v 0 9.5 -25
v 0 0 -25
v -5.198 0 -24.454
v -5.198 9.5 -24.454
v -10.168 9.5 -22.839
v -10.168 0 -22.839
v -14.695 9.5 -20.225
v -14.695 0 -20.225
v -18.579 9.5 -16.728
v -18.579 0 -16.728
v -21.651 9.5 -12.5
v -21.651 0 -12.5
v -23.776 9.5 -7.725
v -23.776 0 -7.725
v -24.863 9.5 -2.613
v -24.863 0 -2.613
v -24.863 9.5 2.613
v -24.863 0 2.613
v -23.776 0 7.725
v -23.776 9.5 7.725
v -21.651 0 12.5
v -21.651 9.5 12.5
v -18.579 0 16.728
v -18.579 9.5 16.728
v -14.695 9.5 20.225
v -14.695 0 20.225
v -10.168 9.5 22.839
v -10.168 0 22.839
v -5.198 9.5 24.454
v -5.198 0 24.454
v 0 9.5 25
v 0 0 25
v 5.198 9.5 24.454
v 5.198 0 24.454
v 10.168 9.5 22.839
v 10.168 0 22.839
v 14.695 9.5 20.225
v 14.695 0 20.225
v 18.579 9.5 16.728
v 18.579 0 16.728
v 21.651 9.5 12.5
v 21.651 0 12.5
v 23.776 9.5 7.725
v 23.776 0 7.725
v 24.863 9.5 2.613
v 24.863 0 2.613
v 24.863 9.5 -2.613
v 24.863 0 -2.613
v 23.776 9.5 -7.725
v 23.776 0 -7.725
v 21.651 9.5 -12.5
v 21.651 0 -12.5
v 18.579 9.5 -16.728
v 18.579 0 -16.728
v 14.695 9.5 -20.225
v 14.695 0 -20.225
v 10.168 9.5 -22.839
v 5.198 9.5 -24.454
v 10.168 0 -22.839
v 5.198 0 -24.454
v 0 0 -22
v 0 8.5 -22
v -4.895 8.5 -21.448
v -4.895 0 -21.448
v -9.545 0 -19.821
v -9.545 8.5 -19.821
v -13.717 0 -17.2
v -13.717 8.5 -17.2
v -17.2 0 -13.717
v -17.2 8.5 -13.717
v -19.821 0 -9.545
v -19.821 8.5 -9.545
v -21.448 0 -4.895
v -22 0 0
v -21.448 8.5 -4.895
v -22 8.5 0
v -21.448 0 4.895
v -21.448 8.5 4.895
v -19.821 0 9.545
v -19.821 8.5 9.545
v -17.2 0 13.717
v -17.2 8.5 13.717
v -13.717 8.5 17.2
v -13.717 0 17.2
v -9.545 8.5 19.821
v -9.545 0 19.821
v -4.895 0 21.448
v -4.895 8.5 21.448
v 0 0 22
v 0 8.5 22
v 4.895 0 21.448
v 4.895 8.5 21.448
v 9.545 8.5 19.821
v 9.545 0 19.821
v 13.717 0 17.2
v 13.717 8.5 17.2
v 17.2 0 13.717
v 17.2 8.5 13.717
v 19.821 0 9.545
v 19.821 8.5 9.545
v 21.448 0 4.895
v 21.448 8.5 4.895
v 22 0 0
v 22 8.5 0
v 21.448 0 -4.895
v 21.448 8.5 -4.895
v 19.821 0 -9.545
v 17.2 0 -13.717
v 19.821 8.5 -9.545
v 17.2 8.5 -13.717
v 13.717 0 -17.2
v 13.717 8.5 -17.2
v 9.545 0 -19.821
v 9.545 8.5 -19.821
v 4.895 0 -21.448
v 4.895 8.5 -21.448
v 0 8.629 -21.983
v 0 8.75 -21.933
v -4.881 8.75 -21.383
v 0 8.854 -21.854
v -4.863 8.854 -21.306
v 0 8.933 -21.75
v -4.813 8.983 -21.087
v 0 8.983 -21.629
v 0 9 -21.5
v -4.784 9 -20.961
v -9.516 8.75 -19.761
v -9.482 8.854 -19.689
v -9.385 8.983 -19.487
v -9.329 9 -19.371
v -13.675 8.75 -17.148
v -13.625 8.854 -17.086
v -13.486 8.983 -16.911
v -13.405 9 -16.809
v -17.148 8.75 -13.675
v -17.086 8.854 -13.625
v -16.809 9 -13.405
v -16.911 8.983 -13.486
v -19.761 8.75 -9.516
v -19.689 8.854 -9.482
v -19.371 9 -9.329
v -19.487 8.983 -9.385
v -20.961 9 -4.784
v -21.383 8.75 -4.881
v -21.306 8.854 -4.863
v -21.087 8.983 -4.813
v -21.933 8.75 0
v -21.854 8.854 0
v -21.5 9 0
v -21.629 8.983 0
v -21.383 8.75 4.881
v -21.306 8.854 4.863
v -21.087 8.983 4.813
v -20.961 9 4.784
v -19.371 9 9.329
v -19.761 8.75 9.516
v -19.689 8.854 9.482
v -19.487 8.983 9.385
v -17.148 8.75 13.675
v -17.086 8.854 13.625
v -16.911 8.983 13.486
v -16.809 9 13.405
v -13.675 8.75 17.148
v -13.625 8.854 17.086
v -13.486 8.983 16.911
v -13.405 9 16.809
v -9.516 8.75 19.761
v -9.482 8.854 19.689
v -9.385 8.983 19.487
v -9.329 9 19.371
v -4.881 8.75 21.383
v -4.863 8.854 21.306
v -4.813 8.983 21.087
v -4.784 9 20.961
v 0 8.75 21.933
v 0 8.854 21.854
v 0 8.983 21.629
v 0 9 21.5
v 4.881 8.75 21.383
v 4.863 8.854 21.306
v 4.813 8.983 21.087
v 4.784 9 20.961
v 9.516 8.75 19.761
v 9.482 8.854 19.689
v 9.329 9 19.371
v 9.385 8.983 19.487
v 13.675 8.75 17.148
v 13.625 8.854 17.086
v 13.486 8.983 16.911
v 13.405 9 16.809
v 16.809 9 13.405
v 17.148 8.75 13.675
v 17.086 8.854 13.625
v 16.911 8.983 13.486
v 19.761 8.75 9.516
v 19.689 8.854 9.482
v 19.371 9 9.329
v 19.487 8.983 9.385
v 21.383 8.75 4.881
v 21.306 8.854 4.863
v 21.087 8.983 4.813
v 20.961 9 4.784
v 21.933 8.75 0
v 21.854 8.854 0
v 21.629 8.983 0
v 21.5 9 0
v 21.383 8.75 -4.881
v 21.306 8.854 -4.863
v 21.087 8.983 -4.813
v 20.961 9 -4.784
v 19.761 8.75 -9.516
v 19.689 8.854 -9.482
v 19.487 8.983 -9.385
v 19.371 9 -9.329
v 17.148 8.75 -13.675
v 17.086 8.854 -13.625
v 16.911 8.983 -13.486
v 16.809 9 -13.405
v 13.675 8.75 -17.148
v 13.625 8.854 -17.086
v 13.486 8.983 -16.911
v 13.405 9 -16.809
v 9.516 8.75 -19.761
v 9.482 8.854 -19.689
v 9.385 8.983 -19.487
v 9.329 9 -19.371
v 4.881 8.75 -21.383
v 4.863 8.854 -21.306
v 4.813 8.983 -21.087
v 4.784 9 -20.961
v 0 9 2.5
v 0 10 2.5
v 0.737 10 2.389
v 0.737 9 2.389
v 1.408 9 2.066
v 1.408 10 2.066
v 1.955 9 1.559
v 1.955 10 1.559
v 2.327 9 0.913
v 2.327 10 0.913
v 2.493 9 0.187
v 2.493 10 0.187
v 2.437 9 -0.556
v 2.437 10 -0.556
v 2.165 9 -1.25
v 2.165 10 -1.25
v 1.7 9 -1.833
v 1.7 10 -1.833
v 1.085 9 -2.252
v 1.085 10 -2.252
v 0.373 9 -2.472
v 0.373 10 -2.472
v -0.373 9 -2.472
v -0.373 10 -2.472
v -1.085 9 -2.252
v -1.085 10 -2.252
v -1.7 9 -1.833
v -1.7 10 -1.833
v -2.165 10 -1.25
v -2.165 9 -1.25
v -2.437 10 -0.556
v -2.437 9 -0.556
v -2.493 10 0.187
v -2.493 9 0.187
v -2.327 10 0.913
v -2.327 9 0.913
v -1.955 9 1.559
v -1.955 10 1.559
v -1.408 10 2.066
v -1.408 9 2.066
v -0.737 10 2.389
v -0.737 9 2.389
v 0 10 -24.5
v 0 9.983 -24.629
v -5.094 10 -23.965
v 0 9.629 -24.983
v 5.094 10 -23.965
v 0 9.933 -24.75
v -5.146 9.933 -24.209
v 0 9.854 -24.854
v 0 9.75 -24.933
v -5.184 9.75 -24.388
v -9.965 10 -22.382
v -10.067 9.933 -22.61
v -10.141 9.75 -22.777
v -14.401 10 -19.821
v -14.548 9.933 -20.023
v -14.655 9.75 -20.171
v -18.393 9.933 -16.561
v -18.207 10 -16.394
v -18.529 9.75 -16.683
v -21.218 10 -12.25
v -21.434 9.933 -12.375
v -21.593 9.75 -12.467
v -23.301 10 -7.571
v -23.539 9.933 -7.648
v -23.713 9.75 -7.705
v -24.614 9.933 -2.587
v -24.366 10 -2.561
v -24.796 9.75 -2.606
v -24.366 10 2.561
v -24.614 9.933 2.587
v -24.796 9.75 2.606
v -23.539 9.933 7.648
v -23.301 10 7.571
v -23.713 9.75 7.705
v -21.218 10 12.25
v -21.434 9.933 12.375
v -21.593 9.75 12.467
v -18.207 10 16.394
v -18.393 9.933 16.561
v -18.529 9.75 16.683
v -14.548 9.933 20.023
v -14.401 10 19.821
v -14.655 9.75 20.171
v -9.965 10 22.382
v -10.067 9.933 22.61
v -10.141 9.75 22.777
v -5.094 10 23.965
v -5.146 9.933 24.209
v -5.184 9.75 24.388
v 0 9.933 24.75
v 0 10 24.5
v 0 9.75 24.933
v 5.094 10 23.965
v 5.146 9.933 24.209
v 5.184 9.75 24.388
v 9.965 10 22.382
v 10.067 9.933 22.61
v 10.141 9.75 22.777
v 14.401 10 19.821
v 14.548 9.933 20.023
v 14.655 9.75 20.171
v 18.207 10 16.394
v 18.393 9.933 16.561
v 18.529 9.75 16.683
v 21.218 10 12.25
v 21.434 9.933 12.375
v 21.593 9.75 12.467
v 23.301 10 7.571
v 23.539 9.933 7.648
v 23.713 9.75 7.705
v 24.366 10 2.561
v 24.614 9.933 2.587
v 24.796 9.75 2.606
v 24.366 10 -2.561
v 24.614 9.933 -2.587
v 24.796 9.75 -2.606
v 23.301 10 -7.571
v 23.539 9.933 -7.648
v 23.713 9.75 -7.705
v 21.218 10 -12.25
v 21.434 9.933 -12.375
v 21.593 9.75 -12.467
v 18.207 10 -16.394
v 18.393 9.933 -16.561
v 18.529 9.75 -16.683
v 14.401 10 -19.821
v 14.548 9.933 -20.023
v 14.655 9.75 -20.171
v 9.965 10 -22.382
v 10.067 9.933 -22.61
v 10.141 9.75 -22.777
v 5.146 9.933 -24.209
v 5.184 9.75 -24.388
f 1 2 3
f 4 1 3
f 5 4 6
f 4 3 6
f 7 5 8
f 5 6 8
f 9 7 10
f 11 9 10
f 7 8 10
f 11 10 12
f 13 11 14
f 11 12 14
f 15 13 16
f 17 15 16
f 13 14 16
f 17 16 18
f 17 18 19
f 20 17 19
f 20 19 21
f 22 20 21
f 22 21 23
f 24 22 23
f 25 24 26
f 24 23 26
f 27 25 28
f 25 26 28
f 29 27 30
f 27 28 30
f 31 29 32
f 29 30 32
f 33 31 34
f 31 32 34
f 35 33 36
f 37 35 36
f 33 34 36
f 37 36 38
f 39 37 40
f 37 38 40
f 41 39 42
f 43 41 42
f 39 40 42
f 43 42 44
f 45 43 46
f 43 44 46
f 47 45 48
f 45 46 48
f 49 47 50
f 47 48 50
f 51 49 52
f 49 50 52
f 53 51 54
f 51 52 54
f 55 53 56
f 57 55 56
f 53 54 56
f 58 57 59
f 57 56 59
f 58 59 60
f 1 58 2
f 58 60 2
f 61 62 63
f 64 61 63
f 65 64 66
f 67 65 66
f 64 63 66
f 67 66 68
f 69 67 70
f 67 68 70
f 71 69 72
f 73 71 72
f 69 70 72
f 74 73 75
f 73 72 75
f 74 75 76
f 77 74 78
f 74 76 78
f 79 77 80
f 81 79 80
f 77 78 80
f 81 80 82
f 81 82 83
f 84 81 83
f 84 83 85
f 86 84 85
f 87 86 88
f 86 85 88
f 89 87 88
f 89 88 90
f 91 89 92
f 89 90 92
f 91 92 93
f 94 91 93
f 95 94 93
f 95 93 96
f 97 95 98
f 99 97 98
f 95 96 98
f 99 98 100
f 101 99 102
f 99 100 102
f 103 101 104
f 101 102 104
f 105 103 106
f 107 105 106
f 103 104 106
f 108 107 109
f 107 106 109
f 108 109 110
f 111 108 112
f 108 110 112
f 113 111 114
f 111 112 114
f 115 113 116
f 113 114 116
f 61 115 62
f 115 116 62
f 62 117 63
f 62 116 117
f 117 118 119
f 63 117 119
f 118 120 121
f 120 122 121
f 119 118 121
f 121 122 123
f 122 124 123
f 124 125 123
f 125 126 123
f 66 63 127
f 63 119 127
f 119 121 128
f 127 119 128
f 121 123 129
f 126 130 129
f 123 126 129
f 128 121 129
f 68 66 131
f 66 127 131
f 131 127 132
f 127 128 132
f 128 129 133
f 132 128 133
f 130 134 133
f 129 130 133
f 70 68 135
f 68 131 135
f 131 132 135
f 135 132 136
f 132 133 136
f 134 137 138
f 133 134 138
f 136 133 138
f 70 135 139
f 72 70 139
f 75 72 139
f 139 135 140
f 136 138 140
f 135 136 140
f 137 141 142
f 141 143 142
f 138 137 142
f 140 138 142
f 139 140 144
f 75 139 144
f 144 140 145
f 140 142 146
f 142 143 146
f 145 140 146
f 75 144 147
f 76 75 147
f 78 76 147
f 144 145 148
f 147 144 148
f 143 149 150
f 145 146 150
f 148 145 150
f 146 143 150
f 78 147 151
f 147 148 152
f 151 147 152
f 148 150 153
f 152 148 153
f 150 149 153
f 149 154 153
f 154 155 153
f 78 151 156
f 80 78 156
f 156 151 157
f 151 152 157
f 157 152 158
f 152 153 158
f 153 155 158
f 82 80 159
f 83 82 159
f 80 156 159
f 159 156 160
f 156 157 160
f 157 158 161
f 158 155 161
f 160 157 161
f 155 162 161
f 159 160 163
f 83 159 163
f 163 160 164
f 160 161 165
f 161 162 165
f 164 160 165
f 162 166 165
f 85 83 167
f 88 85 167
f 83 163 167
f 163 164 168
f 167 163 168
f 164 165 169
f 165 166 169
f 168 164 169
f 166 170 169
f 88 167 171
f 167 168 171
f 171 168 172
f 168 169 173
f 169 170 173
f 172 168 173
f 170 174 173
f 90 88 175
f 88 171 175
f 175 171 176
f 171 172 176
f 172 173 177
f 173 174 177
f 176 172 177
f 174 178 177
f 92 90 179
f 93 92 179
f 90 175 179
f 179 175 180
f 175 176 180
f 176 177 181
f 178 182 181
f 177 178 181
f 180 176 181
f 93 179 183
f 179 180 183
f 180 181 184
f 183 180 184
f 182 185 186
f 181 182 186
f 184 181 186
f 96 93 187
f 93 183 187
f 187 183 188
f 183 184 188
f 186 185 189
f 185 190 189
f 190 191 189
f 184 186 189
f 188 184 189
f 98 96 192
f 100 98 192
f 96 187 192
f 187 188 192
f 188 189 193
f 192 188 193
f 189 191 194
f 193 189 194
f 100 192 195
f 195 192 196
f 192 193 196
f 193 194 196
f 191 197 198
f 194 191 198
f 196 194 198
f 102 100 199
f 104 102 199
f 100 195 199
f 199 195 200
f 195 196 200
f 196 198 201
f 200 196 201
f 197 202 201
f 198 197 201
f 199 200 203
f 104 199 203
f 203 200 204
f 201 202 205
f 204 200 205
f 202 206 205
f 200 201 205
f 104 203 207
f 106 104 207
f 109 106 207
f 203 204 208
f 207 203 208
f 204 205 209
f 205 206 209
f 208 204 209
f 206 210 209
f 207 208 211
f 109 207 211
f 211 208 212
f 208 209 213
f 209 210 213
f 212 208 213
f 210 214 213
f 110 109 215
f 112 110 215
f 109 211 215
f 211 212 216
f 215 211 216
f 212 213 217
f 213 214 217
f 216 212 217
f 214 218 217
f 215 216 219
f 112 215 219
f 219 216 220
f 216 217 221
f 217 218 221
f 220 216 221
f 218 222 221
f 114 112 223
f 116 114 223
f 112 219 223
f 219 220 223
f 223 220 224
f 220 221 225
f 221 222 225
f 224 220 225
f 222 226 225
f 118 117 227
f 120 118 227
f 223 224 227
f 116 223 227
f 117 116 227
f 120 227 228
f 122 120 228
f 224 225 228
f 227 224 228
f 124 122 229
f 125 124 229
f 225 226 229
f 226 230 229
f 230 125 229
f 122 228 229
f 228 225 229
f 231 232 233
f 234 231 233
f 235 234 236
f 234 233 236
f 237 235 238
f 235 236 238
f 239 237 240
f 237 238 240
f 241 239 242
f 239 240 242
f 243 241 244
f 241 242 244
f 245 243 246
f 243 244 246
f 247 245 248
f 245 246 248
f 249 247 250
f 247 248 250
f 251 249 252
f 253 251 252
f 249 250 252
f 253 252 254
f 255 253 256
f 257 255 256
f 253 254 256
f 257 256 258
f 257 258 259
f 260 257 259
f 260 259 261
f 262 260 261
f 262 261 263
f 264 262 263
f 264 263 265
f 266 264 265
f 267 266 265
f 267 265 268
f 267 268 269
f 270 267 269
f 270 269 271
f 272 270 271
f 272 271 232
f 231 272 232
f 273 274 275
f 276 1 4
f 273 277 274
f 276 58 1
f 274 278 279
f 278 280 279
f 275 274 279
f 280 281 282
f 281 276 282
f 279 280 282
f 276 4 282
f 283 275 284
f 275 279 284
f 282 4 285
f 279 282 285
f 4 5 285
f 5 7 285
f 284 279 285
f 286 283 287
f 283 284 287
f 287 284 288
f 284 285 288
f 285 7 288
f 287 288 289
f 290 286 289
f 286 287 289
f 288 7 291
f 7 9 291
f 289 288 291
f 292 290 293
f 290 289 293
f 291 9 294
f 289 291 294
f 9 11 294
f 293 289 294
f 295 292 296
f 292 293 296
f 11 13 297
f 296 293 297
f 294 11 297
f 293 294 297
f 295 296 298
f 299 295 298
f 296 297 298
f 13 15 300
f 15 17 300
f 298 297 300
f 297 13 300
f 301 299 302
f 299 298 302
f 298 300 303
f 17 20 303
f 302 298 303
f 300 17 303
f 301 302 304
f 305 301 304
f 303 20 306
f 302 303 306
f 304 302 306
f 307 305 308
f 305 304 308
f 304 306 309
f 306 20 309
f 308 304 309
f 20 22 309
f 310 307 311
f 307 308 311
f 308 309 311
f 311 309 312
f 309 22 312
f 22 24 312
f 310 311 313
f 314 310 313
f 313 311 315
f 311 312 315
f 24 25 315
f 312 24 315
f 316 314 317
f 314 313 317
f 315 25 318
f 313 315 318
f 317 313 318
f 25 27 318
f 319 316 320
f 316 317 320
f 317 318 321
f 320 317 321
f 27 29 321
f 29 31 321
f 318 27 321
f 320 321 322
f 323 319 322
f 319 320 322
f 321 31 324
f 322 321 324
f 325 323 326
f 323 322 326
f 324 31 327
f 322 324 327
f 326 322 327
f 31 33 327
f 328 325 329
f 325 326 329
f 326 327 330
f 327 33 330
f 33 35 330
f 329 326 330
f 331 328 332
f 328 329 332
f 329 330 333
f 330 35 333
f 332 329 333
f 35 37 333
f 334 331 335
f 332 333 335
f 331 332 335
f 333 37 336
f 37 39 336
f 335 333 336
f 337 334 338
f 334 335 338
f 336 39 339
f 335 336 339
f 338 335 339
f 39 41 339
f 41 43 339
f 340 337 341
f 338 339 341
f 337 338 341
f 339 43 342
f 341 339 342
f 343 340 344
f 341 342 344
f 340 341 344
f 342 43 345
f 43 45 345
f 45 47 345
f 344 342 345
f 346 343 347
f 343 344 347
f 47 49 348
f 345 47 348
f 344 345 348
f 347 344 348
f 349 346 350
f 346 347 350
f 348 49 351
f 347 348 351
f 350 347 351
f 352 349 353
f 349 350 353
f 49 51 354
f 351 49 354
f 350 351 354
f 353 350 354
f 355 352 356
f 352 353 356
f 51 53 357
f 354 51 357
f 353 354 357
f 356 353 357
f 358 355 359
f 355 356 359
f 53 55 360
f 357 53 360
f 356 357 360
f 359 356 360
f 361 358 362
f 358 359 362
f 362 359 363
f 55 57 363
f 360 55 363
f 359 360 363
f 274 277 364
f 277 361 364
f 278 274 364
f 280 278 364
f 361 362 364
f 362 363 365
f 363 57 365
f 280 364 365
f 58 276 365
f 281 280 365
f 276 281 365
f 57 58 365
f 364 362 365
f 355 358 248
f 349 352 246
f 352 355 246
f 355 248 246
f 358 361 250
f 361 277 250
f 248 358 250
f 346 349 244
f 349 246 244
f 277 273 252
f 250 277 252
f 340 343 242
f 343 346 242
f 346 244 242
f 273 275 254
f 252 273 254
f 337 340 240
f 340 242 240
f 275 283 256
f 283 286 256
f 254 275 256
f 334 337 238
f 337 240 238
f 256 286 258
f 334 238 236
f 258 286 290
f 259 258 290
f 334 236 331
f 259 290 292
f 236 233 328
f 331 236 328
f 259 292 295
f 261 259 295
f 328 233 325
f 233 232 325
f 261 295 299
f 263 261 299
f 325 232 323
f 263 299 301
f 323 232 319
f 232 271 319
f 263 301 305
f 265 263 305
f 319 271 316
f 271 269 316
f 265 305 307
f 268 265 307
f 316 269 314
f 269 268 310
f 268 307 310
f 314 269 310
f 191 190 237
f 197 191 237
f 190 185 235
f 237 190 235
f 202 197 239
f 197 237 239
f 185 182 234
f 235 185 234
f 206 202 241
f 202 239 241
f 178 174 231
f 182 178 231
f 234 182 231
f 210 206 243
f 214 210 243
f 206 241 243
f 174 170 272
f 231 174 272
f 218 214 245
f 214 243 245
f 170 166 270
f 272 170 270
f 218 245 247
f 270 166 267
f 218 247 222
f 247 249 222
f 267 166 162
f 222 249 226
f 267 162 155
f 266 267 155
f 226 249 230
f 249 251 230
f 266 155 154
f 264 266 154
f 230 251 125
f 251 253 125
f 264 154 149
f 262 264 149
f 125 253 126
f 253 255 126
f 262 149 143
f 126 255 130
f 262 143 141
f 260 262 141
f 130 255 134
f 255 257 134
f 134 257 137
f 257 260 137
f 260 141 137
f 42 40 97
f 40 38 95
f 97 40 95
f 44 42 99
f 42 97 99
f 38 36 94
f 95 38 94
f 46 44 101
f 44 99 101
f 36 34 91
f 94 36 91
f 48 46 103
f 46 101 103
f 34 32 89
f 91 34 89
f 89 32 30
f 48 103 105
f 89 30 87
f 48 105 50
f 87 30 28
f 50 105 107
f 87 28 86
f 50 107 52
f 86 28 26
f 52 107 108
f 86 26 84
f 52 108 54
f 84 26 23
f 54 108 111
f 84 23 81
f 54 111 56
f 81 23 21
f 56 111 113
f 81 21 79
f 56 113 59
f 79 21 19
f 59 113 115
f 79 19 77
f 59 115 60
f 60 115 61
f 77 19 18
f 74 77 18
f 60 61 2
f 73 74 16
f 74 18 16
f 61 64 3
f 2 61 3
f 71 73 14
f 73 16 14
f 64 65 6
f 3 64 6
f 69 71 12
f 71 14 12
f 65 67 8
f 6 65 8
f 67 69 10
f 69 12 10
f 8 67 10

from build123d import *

# Parameters (mm, degrees)
CONG_1_R                = 0.5
ESQUISSE2_R             = 2.5
ENL_V_MAT_EXTRU_1_DEPTH = 10


with BuildPart() as part:
    # Esquisse1 → Révolution1 (revolve)
    with BuildSketch(Plane(origin=(0, 0, 0), x_dir=(0, 0, -1), z_dir=(1, 0, 0)), mode=Mode.PRIVATE) as r_volution1_sk:
        Polygon((0, 10), (-25, 10), (-25, 0), (-22, 0), (-22, 9), (0, 9), align=None)
    revolve(r_volution1_sk.sketch.rotate(Axis((0, 0, 0), (0, 1, 0)), 180), axis=Axis((0, 0, 0), (0, 1, 0)))

    # Congé1
    cong_1_edges = [part.edges().sort_by_distance(p)[0] for p in [
        (0, 9, 22),
        (0, 10, 25),
    ]]
    fillet(cong_1_edges, radius=CONG_1_R)

    # Esquisse2 → Enlèv. mat.-Extru.1 (cut)
    with BuildSketch(Plane(origin=(0, 10, 0), x_dir=(1, 0, 0), z_dir=(0, 1, 0))):
        with Locations(Location((0, 0, 0), (0, 0, 270))):
            Circle(ESQUISSE2_R)
    extrude(amount=-ENL_V_MAT_EXTRU_1_DEPTH, mode=Mode.SUBTRACT)


solid = part.part
